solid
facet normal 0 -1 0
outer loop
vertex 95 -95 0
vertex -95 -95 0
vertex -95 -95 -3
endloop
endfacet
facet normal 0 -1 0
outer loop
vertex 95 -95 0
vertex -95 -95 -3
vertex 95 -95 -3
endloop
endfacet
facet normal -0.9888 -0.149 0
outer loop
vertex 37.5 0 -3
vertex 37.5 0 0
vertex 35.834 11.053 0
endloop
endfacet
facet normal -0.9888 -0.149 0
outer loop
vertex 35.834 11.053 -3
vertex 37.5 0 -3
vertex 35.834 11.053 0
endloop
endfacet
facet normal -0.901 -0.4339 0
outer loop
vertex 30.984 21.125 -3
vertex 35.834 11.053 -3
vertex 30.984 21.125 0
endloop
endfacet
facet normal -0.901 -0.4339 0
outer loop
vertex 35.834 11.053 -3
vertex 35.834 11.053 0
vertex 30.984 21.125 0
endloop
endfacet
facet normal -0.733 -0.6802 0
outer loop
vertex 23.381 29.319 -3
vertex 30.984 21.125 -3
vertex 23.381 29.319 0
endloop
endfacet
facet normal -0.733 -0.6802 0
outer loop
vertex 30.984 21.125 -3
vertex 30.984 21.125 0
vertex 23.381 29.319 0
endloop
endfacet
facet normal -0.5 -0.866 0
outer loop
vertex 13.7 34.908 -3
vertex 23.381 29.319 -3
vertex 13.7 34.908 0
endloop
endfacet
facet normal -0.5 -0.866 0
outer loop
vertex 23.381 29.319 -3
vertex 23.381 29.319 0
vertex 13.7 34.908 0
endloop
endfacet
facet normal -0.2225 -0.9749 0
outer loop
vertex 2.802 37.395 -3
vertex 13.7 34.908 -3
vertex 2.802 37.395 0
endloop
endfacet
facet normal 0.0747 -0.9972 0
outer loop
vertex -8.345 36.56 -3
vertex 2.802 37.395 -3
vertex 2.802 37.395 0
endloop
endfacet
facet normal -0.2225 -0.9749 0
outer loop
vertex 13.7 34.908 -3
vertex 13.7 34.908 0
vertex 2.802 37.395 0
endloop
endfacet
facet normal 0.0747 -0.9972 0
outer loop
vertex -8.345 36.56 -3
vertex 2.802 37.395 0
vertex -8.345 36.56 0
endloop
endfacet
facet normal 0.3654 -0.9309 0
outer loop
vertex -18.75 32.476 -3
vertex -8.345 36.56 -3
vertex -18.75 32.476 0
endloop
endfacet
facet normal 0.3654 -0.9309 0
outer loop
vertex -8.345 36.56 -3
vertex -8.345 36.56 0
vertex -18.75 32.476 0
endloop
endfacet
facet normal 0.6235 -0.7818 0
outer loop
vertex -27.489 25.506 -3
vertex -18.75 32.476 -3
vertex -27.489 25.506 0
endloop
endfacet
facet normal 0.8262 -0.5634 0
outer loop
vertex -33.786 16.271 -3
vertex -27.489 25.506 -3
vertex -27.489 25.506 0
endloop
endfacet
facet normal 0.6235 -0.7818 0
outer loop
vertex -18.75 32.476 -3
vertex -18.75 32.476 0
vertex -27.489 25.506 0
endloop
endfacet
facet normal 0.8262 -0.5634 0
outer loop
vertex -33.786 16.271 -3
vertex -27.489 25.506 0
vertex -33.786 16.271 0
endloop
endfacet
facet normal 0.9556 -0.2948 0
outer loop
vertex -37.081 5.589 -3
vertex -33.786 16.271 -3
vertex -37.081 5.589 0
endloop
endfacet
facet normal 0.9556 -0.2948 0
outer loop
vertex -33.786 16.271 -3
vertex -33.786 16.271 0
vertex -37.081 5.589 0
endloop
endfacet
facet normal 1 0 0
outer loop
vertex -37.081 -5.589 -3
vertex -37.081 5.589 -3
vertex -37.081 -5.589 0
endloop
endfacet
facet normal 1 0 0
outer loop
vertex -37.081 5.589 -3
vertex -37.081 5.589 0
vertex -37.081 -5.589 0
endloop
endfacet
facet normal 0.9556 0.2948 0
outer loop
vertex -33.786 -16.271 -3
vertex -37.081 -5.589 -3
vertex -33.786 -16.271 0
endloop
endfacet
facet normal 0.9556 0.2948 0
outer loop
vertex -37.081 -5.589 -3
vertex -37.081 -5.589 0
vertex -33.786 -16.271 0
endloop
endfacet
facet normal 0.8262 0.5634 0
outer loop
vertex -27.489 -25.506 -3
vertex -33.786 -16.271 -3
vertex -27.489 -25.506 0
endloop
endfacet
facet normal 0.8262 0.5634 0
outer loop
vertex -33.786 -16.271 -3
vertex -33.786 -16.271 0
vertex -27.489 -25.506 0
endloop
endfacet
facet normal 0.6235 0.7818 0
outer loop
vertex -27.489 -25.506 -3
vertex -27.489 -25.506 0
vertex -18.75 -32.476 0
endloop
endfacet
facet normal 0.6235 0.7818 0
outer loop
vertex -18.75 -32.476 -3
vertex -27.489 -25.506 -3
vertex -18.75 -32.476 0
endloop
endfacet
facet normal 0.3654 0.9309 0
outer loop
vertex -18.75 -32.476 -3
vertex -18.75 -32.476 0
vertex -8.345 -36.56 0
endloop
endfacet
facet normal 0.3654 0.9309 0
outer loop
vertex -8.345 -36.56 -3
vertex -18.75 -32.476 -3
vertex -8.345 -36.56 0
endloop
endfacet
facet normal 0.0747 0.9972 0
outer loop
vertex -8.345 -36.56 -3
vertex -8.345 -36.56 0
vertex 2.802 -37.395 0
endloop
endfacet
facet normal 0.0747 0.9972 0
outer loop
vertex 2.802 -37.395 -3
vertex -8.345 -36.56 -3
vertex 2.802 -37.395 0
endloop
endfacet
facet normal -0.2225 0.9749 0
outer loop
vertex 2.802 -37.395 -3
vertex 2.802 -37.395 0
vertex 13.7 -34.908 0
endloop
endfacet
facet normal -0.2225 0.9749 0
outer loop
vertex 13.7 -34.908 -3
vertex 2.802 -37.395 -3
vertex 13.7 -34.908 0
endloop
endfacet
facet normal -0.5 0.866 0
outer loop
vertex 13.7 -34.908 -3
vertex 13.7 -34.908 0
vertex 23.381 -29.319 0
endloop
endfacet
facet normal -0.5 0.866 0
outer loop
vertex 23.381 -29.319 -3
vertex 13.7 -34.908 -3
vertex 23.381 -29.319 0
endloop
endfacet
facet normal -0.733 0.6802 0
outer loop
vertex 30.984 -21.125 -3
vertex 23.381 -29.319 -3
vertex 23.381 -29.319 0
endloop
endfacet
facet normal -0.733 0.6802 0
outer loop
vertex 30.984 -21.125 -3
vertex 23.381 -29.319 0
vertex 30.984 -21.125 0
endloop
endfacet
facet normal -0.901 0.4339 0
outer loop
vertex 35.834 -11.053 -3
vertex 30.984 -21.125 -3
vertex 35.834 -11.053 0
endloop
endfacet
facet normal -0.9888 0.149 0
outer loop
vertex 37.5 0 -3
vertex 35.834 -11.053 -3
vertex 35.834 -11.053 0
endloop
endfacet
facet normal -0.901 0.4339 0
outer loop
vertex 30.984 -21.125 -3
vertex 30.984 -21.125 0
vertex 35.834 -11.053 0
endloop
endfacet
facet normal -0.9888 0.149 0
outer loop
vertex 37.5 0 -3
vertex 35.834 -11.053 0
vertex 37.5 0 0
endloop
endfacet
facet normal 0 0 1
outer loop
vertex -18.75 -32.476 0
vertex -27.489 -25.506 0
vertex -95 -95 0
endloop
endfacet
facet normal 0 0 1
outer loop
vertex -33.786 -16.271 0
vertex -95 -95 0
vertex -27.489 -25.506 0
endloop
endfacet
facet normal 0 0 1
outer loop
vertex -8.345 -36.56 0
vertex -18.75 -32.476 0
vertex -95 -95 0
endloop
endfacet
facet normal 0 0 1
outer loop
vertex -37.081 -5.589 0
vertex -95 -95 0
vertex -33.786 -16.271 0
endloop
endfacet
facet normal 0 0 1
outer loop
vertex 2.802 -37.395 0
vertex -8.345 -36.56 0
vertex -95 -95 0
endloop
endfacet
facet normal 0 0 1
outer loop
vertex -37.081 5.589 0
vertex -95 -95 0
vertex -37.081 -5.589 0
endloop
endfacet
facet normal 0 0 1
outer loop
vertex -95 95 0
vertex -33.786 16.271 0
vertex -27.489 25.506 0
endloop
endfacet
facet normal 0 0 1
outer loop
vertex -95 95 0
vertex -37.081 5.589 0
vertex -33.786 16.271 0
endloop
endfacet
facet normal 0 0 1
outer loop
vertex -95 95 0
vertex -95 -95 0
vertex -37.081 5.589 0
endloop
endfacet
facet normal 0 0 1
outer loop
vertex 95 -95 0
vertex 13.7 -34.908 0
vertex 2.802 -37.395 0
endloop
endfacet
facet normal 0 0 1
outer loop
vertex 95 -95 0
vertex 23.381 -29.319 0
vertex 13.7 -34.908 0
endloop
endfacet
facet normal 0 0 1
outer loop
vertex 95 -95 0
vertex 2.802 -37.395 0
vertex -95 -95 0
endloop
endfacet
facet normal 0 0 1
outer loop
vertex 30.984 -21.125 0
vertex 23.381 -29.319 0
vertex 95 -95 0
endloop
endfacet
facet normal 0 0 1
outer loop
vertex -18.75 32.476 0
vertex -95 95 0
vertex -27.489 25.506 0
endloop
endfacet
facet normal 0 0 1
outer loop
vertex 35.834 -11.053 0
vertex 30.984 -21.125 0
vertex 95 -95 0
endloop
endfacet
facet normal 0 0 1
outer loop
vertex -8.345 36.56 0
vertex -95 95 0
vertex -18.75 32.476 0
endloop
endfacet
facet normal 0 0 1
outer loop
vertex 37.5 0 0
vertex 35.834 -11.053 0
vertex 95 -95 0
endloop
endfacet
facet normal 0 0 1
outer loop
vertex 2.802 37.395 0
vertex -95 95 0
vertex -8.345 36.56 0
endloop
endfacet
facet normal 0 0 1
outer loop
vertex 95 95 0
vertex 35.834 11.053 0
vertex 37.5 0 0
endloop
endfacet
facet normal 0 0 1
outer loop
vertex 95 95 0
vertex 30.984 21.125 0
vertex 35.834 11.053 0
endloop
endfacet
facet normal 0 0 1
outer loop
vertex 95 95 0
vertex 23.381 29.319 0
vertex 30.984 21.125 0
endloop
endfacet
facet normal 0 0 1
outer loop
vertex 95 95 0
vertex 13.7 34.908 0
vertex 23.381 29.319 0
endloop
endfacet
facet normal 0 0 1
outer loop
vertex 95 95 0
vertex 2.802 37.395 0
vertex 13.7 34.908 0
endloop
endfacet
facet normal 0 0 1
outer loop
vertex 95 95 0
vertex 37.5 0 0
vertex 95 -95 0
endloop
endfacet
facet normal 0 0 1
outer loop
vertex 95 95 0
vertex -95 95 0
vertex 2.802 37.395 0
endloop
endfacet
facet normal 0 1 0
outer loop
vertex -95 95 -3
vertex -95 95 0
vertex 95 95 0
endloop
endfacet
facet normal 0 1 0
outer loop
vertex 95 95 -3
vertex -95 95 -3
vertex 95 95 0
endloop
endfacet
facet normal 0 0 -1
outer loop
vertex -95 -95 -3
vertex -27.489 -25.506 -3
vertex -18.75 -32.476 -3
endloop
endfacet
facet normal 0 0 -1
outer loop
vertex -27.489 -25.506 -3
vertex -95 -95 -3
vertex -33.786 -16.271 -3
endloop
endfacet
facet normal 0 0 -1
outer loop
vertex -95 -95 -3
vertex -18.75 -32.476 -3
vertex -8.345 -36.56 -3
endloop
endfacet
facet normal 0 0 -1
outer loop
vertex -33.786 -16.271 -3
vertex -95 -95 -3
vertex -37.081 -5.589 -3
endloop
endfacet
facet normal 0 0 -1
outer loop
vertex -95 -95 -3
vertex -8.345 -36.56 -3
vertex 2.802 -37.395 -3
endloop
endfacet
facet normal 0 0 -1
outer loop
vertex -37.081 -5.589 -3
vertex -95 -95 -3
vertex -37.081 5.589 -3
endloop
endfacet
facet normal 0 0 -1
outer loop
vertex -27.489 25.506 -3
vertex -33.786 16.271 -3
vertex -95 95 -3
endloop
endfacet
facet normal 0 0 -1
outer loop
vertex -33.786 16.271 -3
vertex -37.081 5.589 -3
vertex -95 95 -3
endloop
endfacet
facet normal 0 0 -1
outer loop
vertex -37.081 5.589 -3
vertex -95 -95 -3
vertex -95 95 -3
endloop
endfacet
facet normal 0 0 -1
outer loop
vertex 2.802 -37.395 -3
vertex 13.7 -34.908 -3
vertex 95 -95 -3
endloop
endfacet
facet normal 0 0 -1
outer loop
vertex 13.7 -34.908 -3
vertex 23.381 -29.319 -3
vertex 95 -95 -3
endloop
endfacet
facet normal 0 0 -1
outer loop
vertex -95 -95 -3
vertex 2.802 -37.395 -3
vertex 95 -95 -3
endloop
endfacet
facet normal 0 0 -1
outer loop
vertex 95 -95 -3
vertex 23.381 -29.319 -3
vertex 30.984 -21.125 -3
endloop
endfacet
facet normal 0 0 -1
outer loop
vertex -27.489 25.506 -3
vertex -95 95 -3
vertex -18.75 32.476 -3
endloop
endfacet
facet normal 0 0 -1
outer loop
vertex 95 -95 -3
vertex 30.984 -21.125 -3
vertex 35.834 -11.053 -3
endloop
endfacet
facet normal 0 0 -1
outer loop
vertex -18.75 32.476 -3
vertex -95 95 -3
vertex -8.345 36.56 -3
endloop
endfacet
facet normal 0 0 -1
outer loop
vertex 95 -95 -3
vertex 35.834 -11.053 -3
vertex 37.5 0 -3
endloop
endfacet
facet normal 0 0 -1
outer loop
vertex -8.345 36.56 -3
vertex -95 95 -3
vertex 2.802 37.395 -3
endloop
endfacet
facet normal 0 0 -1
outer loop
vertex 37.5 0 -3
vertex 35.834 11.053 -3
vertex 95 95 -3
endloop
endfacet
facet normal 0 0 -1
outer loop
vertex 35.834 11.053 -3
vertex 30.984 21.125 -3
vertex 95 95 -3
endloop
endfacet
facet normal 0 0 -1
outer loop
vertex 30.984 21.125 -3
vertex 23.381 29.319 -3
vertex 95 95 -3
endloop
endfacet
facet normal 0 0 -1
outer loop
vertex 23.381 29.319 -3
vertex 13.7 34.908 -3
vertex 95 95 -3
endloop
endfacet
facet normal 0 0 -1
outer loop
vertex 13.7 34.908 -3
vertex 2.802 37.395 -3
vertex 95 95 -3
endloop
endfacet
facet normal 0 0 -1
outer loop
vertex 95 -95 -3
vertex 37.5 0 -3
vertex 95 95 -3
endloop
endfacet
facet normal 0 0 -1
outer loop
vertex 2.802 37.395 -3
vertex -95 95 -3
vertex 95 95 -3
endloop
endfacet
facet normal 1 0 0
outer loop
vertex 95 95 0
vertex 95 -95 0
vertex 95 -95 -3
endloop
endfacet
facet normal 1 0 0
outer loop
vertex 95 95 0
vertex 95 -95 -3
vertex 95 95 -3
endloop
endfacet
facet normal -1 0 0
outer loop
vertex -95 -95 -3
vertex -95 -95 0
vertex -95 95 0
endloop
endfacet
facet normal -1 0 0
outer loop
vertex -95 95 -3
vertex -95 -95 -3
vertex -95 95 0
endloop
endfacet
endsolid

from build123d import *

# Parameters (mm, degrees)
SKETCH1_W        = 190
SKETCH1_H        = 190
SKETCH1_R        = 37.5
MAIN_PLATE_DEPTH = 3


# Sheet-metal steps are written as plain solids
with BuildPart() as part:
    # Sketch1 → Main Plate (new body)
    with BuildSketch(Plane.XY):
        Rectangle(SKETCH1_W, SKETCH1_H)
        Circle(SKETCH1_R, mode=Mode.SUBTRACT)
    extrude(amount=-MAIN_PLATE_DEPTH)


solid = part.part
